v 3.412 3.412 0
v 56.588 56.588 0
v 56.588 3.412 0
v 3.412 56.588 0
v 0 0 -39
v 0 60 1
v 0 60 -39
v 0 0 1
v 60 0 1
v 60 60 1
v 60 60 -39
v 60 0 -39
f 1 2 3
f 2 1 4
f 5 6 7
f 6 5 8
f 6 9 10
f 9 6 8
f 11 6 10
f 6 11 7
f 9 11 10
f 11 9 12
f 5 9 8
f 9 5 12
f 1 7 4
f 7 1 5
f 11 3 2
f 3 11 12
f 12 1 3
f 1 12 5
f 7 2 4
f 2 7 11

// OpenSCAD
outer_size = [60,60,40];//外箱のサイズ
tilt = 5;//傾斜の角度
btm_thick = 1;//底の厚み

inner_height = outer_size[2]-btm_thick;

module wall(){
rotate([-90,0,0]){
linear_extrude(outer_size[0]){
polygon([[0,0],[0,inner_height],[tan(tilt)*inner_height,0]]);
}
}
}

union(){
linear_extrude(btm_thick){
square([outer_size[0],outer_size[1]]);
}
wall();
translate([outer_size[0],outer_size[1],0]){
rotate([0,0,180]){
    wall();
}    
}
translate([outer_size[0],0,0]){
rotate([0,0,90]){
    wall();
}    
}
translate([0,outer_size[1],0]){
rotate([0,0,-90]){
    wall();
}    
}
}
